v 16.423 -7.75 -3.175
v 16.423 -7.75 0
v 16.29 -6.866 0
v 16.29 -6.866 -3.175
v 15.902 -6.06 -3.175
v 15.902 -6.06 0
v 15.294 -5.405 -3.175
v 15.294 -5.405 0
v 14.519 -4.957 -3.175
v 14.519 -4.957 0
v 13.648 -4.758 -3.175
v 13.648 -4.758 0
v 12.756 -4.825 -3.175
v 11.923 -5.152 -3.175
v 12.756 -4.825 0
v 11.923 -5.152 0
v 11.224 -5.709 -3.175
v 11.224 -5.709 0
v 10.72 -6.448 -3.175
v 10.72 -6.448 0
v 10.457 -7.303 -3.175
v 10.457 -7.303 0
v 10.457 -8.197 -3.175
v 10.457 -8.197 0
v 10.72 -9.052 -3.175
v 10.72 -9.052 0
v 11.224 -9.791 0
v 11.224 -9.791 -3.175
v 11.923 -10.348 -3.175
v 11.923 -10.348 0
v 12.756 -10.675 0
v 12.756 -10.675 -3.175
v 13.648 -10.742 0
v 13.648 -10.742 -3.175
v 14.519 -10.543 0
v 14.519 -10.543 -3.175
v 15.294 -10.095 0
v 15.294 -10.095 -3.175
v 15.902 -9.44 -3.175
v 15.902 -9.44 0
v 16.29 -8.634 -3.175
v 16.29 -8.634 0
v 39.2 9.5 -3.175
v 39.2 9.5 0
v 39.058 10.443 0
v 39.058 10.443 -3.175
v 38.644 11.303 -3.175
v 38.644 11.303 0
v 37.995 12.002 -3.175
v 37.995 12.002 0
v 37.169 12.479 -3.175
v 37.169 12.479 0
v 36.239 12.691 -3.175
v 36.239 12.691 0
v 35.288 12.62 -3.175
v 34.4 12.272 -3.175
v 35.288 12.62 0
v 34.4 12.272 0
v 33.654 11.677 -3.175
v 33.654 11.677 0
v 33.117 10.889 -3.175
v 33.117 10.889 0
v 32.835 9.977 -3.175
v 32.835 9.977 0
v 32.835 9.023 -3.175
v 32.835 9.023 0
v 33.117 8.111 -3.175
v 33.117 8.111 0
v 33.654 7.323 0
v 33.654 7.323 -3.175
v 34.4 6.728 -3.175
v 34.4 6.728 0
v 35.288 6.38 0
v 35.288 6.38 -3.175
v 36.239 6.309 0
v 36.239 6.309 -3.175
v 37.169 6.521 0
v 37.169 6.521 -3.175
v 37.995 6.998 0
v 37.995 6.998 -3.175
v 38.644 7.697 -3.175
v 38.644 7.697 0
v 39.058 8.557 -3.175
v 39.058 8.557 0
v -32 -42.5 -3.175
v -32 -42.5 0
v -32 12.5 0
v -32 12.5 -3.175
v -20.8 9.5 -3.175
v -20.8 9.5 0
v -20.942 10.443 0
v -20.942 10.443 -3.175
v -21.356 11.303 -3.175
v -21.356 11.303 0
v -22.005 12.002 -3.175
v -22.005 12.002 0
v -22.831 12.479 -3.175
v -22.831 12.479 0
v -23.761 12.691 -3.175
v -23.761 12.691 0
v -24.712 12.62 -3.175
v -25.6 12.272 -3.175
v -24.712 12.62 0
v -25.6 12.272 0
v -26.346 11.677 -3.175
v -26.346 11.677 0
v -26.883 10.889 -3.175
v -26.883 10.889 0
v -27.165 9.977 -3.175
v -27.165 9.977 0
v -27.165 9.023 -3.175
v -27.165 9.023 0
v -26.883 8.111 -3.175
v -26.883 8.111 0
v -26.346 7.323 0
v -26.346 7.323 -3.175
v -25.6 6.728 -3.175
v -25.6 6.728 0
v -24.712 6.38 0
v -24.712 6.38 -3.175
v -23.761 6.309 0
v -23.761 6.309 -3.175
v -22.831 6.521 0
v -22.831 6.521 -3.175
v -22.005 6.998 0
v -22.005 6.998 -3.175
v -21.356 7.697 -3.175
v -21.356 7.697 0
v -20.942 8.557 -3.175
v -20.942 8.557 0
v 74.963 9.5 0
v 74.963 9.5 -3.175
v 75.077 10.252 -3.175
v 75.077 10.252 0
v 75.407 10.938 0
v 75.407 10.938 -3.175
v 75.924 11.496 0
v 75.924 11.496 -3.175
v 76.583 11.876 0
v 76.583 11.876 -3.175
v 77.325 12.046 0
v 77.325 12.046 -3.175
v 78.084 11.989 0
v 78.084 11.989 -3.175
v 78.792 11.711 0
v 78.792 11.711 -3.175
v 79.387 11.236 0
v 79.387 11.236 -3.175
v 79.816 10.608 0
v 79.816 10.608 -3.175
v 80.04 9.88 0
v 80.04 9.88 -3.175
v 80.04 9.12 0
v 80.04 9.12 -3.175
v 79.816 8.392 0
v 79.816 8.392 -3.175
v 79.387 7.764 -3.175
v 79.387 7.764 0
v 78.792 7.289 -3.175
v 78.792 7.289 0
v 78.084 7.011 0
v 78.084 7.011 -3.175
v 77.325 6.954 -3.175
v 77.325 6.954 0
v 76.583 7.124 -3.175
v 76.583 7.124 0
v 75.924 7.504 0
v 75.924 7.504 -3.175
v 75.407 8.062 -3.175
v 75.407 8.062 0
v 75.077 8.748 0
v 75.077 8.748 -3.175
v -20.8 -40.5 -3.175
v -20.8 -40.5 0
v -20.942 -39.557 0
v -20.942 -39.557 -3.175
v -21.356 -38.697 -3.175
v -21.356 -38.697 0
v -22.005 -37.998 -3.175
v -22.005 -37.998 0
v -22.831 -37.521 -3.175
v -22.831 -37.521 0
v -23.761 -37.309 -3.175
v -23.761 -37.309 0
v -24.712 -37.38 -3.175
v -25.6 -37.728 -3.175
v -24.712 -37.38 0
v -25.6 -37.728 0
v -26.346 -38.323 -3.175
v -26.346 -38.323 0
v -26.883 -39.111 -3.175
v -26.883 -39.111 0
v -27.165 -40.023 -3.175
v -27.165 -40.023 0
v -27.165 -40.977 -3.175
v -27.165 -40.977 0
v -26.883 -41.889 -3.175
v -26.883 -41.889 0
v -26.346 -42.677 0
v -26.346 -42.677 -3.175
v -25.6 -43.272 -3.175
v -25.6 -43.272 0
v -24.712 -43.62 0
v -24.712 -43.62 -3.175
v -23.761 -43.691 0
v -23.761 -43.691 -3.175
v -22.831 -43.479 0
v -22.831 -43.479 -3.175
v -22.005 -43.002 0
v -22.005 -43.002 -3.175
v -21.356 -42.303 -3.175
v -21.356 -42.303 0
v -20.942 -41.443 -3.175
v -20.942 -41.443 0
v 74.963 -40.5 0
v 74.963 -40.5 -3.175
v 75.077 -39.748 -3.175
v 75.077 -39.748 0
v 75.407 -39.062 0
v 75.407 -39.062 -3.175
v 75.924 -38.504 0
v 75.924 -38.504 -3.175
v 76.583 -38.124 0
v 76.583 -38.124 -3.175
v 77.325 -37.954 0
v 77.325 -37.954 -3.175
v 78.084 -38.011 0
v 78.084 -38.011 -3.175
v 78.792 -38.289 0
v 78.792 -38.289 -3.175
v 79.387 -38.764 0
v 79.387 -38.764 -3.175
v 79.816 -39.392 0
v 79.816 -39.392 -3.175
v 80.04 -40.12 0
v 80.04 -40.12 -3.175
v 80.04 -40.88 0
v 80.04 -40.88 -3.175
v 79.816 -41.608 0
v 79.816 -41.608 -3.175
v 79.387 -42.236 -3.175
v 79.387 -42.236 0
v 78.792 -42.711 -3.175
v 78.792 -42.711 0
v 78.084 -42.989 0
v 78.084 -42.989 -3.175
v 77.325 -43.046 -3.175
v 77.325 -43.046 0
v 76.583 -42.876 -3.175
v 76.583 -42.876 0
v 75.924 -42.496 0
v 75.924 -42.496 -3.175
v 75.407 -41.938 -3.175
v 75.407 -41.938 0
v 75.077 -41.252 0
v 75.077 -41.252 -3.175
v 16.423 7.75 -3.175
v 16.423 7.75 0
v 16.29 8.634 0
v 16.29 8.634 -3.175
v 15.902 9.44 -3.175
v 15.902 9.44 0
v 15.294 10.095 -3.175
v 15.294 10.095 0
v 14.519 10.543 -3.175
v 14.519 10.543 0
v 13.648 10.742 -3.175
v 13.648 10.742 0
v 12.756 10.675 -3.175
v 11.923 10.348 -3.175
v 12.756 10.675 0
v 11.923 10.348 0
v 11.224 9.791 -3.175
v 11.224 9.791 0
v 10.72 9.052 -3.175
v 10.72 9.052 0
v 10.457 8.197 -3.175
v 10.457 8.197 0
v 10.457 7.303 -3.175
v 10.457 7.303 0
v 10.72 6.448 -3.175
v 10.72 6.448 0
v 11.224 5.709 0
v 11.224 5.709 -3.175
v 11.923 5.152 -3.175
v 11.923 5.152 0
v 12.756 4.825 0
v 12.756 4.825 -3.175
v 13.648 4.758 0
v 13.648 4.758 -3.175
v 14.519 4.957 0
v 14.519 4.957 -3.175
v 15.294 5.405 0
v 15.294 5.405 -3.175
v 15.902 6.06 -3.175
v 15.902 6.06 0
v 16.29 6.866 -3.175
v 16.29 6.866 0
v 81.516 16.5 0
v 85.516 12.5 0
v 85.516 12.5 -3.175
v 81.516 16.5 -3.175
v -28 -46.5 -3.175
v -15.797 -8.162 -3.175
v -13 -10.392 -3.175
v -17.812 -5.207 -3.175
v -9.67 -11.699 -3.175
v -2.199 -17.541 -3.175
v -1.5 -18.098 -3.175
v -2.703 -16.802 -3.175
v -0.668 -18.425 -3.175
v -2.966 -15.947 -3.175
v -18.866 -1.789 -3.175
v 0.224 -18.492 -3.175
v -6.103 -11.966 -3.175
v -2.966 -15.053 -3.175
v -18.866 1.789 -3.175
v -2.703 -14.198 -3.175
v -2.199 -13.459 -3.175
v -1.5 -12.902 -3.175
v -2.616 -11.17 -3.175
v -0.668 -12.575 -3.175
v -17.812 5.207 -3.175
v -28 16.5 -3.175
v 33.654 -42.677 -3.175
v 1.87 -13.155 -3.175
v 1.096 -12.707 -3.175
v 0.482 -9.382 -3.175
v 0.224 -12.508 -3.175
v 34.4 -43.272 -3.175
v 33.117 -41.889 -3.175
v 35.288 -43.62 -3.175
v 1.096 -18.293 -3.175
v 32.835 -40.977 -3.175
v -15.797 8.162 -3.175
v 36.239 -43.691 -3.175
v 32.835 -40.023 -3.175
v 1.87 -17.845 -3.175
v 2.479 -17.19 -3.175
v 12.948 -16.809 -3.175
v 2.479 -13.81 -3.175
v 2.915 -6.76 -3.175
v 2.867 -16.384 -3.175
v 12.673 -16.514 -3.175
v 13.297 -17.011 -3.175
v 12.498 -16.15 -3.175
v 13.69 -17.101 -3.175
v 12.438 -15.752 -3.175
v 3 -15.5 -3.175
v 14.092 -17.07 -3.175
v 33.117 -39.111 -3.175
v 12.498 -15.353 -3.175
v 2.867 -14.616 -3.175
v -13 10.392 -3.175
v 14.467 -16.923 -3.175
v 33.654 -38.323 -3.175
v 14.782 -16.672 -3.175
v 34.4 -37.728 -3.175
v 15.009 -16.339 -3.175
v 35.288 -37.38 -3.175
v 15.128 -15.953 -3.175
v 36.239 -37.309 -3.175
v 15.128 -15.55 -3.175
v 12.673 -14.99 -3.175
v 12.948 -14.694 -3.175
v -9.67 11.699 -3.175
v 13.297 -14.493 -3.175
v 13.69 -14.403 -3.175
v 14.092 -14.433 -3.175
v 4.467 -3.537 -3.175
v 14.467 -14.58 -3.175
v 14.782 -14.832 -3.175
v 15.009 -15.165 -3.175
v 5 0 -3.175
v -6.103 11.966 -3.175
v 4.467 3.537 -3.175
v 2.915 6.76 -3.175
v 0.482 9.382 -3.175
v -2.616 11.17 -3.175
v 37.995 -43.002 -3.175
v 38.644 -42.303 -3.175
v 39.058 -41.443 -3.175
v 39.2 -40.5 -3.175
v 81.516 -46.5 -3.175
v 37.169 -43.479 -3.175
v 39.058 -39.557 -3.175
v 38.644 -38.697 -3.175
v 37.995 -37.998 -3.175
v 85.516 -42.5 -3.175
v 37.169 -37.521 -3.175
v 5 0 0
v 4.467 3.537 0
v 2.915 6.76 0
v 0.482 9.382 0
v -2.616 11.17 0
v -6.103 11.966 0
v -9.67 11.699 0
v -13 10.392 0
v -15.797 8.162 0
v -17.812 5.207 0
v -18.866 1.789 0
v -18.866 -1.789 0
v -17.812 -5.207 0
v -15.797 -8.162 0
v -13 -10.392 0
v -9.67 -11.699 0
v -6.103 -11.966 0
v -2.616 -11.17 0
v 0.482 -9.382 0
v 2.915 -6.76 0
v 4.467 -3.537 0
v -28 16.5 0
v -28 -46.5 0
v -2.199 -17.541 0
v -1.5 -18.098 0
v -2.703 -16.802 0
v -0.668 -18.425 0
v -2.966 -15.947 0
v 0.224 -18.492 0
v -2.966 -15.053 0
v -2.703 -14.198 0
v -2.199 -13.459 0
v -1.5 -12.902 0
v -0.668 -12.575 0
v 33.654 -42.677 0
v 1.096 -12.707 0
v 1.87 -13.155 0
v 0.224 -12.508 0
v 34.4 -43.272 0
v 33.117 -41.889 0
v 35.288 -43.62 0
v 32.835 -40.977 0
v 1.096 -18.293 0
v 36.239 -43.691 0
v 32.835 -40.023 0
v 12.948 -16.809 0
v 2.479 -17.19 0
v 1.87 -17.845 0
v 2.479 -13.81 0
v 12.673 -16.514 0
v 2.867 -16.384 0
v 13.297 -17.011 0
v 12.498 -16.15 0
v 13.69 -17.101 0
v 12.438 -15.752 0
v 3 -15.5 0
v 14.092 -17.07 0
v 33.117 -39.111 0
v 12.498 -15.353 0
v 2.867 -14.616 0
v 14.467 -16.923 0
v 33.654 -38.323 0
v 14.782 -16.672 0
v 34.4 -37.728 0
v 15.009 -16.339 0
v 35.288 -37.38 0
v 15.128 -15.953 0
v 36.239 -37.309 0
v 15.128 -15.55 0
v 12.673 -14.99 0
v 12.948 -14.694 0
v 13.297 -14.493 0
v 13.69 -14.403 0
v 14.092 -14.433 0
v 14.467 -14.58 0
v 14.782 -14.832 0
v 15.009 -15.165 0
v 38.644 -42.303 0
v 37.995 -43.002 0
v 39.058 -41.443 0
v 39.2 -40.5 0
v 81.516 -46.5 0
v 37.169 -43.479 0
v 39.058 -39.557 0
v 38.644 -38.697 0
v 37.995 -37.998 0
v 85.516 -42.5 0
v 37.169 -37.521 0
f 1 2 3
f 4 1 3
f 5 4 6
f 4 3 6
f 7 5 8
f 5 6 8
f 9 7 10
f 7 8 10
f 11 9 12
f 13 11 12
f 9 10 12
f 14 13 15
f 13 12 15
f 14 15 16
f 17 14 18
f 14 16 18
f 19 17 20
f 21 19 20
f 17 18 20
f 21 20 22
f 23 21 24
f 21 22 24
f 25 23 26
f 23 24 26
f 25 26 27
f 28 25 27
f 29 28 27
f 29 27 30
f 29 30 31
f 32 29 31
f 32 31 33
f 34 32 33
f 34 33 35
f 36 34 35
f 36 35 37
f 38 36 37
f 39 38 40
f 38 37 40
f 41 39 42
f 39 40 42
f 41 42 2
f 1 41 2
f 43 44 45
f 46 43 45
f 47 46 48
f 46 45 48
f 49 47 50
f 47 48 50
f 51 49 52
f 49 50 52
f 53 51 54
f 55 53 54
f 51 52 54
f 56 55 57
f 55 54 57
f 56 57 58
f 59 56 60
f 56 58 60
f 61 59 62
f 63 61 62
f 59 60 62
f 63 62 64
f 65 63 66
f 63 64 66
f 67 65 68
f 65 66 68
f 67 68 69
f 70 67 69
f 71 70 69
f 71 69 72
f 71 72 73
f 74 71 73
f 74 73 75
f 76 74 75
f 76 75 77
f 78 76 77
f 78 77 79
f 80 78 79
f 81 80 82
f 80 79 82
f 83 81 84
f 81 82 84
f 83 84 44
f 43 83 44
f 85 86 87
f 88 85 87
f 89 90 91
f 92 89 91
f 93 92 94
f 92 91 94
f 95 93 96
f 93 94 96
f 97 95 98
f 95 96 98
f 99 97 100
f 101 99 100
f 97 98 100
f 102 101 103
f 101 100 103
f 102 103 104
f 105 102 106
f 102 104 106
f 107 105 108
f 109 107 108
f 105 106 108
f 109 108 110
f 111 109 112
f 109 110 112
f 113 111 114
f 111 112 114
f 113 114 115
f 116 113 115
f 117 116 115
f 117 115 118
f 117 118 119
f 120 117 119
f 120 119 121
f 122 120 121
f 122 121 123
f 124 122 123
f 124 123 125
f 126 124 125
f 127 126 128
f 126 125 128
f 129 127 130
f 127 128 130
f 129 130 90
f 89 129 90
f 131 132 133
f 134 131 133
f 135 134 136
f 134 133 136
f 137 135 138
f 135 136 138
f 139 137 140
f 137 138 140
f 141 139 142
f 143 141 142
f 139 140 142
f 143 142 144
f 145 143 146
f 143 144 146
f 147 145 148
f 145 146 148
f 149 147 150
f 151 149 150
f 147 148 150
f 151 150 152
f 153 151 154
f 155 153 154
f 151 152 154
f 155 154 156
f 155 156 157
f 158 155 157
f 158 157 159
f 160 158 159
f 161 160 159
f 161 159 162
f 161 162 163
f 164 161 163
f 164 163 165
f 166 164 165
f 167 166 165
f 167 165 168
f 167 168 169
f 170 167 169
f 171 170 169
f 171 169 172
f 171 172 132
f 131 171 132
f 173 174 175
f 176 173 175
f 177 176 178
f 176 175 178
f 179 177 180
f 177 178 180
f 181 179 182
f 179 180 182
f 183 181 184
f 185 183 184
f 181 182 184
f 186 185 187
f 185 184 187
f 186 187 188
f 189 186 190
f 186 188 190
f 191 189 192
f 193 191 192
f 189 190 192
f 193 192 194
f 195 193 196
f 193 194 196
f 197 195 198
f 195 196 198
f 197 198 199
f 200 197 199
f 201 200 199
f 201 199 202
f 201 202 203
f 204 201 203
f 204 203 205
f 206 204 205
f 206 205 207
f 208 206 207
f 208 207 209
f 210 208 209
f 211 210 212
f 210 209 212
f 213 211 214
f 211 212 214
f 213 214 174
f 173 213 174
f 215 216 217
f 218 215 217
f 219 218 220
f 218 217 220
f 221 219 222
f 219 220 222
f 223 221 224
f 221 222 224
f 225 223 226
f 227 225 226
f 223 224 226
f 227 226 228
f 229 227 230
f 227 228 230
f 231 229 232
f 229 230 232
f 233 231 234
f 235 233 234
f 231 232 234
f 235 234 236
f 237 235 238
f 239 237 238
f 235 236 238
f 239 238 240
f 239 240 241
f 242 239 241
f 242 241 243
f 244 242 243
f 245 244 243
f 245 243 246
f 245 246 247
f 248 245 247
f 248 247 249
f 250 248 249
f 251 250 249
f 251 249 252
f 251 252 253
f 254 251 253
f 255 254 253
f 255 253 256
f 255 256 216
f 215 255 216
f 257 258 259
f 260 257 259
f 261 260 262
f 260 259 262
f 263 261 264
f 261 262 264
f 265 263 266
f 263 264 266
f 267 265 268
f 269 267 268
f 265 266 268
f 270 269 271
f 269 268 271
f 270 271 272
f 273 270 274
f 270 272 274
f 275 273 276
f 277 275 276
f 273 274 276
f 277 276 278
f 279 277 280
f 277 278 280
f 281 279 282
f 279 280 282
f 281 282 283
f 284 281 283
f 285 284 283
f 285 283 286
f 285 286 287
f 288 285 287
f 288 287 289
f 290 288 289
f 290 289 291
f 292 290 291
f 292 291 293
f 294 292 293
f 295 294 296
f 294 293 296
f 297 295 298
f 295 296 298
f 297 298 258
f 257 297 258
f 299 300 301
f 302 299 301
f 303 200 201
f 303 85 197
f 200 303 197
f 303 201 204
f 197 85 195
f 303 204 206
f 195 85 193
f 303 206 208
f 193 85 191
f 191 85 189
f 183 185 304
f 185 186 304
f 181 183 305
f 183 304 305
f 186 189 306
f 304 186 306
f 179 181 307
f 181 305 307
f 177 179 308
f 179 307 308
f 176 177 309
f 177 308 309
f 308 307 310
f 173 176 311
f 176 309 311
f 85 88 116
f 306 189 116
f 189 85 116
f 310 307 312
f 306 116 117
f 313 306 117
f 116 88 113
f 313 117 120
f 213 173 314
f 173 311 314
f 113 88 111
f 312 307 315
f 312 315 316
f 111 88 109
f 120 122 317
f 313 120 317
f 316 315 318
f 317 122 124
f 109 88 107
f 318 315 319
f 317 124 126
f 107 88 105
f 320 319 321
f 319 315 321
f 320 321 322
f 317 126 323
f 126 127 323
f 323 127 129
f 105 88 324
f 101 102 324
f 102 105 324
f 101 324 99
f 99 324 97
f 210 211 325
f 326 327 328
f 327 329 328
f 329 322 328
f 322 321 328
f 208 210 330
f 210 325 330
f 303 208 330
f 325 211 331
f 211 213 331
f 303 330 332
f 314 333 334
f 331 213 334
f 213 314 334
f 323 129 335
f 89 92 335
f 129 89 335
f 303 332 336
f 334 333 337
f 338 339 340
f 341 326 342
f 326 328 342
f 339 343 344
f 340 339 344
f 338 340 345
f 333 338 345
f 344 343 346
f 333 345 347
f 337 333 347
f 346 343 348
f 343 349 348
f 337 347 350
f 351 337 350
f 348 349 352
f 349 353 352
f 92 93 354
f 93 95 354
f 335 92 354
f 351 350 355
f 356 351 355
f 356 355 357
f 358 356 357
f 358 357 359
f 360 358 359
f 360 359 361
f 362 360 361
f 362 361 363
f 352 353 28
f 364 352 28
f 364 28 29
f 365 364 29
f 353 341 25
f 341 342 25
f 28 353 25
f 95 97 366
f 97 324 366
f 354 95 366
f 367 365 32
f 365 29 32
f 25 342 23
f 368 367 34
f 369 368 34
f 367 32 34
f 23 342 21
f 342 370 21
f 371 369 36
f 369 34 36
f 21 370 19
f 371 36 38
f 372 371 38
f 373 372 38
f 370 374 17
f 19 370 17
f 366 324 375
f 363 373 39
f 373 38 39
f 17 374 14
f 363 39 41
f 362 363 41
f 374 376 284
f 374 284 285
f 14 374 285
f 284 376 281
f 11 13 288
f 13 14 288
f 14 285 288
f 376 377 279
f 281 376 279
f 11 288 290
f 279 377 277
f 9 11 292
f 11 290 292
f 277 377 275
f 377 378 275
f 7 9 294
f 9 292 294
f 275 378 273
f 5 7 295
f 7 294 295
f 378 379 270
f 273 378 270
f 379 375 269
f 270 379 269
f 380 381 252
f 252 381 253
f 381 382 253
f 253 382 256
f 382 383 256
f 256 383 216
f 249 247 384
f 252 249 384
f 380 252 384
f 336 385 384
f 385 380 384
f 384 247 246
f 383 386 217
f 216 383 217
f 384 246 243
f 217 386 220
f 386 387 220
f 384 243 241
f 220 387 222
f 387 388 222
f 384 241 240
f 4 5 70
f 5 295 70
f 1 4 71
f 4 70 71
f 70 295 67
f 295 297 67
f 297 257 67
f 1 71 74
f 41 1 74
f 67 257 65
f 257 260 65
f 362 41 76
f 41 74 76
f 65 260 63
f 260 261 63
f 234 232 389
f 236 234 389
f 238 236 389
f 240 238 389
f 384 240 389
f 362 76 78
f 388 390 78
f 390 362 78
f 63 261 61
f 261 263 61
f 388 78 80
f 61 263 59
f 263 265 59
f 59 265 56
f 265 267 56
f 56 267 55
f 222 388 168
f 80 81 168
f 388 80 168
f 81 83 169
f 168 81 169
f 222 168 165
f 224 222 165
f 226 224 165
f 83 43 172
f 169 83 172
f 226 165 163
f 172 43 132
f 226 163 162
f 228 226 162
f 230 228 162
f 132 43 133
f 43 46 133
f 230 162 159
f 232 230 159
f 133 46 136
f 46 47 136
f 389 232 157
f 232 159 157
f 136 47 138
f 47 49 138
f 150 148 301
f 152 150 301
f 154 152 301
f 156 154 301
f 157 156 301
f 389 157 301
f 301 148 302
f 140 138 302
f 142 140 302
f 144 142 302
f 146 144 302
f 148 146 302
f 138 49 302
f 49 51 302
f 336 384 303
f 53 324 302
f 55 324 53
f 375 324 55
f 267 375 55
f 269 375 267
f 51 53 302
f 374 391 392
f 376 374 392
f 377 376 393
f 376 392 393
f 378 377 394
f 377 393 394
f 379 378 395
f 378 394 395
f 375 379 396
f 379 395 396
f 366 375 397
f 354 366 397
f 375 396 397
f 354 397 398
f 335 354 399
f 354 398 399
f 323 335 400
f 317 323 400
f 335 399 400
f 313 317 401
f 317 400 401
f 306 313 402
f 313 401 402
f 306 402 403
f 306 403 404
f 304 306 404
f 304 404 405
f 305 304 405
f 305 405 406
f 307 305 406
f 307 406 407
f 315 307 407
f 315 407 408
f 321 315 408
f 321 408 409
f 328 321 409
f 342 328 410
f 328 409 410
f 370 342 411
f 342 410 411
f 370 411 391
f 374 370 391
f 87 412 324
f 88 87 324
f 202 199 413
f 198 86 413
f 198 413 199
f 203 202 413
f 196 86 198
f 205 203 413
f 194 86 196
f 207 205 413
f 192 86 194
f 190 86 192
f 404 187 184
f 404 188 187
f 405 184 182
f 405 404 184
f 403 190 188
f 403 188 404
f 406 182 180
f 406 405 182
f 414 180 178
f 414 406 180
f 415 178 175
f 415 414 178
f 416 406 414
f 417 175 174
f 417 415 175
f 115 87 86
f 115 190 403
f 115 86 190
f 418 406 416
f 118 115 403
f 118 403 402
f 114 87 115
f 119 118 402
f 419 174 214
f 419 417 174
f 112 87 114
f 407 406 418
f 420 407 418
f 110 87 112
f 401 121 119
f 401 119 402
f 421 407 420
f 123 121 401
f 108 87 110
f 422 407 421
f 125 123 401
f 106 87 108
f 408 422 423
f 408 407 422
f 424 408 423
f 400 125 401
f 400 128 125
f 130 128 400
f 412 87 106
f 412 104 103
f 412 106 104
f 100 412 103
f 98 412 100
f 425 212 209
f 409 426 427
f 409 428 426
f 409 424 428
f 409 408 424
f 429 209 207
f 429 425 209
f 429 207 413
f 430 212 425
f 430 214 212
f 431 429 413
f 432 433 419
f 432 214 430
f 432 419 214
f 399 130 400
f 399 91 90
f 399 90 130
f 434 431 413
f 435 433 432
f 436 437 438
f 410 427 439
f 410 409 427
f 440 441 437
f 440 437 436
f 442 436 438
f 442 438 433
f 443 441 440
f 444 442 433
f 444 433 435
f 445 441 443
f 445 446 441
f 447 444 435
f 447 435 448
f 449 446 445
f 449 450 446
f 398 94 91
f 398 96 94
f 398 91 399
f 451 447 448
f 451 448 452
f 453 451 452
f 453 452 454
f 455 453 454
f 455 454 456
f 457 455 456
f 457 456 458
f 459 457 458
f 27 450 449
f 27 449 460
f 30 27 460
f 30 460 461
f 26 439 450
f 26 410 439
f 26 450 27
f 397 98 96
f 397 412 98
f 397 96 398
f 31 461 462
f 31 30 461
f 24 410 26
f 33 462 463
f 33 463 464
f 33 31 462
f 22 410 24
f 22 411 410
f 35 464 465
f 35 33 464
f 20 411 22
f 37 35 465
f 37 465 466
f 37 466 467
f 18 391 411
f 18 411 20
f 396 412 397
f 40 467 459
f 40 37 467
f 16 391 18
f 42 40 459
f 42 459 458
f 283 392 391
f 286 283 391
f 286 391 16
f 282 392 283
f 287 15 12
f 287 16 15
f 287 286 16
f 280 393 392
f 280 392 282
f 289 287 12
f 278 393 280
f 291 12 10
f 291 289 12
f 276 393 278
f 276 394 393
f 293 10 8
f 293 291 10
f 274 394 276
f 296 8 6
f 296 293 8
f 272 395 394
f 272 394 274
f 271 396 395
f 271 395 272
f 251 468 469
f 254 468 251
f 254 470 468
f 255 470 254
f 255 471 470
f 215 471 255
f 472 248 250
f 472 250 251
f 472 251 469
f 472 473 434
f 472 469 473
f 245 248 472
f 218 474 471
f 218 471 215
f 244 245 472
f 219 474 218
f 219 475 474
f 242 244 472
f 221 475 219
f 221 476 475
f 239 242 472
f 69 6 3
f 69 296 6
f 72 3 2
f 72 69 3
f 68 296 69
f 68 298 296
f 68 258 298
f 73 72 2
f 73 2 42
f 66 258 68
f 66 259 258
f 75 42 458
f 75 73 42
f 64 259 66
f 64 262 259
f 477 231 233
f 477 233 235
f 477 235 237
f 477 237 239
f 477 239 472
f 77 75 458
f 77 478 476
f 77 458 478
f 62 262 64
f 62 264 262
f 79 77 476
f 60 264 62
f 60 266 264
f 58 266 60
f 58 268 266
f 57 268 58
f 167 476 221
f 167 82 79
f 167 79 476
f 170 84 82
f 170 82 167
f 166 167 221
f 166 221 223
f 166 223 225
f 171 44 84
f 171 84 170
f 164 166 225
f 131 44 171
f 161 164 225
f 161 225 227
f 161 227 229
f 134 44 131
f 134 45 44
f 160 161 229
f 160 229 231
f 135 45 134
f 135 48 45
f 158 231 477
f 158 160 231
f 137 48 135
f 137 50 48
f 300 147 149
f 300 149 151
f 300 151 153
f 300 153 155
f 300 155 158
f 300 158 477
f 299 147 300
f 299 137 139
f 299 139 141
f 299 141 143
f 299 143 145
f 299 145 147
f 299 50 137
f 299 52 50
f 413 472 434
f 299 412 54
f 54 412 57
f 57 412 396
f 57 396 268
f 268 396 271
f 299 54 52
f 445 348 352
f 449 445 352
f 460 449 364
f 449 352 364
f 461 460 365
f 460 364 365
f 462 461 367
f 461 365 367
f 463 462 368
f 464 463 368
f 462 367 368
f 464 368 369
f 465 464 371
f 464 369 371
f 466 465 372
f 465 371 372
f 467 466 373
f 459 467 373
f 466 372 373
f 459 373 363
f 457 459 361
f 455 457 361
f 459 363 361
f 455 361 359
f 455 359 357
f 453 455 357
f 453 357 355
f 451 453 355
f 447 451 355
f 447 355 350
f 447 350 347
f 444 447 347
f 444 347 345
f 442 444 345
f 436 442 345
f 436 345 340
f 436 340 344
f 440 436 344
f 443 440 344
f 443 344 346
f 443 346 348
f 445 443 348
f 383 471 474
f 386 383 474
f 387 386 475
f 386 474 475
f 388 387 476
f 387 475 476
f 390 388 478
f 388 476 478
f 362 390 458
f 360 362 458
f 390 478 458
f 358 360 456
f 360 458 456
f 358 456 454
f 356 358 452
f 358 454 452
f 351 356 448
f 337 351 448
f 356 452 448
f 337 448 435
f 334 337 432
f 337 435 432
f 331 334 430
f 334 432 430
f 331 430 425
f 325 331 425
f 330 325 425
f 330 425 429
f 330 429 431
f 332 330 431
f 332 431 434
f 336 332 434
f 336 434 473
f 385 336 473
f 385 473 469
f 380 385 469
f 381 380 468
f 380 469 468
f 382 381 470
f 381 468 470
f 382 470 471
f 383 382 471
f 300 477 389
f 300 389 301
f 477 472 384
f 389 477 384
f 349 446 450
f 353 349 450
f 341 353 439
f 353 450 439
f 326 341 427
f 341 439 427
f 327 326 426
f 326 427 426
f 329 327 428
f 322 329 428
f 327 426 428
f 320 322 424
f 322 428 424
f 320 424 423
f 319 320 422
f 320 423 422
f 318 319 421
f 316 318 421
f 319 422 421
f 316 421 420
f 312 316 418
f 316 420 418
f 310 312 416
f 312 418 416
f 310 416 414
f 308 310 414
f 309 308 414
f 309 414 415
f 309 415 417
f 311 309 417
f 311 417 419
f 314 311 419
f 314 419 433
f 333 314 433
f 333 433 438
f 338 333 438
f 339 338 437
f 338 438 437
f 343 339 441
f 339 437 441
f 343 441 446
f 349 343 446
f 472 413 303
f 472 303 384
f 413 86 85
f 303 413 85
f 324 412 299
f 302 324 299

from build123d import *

# Parameters (mm, degrees)
SKETCH1_W               = 117.516
SKETCH1_H               = 63
SKETCH1_R               = 3.2004
SKETCH1_R_2             = 3
SKETCH1_R_3             = 12
BOSS_EXTRUDE1_DEPTH     = 3.175
CHAMFER1_SIZE           = 4
F_1_4_20_TAPPED_HOLE1_D = 5.1054
F_6_32_TAPPED_HOLE1_D   = 2.7051


with BuildPart() as part:
    # Sketch1 → Boss-Extrude1 (new body)
    with BuildSketch(Plane.XY):
        with Locations((26.758, -14.99999999)):
            Rectangle(SKETCH1_W, SKETCH1_H)
        with Locations((-24, 9.50000001)):
            Circle(SKETCH1_R, mode=Mode.SUBTRACT)
        with Locations((13.423393759, 7.75)):
            Circle(SKETCH1_R_2, mode=Mode.SUBTRACT)
        with Locations((-7, 0)):
            Circle(SKETCH1_R_3, mode=Mode.SUBTRACT)
        with Locations((13.423393759, -7.75)):
            Circle(SKETCH1_R_2, mode=Mode.SUBTRACT)
        with Locations((-24, -40.49999999)):
            Circle(SKETCH1_R, mode=Mode.SUBTRACT)
        with Locations((0, -15.5)):
            Circle(SKETCH1_R_2, mode=Mode.SUBTRACT)
        with Locations((36, -40.49999999)):
            Circle(SKETCH1_R, mode=Mode.SUBTRACT)
        with Locations((36, 9.50000001)):
            Circle(SKETCH1_R, mode=Mode.SUBTRACT)
    extrude(amount=-BOSS_EXTRUDE1_DEPTH)

    # Chamfer1
    chamfer1_edges = [part.edges().sort_by_distance(p)[0] for p in [
        (-32, -46.49999999, -1.5875),
        (-32, 16.50000001, -1.5875),
        (85.516, 16.50000001, -1.5875),
        (85.516, -46.49999999, -1.5875),
    ]]
    chamfer(chamfer1_edges, length=CHAMFER1_SIZE)

    # 1/4-20 Tapped Hole1 (through all)
    with Locations(Plane.XY):
        with Locations((77.516, 9.50000001), (77.516, -40.49999999)):
            Hole(F_1_4_20_TAPPED_HOLE1_D / 2)

    # #6-32 Tapped Hole1 (through all)
    with Locations(Plane.XY):
        with Locations((13.79086472, -15.75179999)):
            Hole(F_6_32_TAPPED_HOLE1_D / 2)


solid = part.part
